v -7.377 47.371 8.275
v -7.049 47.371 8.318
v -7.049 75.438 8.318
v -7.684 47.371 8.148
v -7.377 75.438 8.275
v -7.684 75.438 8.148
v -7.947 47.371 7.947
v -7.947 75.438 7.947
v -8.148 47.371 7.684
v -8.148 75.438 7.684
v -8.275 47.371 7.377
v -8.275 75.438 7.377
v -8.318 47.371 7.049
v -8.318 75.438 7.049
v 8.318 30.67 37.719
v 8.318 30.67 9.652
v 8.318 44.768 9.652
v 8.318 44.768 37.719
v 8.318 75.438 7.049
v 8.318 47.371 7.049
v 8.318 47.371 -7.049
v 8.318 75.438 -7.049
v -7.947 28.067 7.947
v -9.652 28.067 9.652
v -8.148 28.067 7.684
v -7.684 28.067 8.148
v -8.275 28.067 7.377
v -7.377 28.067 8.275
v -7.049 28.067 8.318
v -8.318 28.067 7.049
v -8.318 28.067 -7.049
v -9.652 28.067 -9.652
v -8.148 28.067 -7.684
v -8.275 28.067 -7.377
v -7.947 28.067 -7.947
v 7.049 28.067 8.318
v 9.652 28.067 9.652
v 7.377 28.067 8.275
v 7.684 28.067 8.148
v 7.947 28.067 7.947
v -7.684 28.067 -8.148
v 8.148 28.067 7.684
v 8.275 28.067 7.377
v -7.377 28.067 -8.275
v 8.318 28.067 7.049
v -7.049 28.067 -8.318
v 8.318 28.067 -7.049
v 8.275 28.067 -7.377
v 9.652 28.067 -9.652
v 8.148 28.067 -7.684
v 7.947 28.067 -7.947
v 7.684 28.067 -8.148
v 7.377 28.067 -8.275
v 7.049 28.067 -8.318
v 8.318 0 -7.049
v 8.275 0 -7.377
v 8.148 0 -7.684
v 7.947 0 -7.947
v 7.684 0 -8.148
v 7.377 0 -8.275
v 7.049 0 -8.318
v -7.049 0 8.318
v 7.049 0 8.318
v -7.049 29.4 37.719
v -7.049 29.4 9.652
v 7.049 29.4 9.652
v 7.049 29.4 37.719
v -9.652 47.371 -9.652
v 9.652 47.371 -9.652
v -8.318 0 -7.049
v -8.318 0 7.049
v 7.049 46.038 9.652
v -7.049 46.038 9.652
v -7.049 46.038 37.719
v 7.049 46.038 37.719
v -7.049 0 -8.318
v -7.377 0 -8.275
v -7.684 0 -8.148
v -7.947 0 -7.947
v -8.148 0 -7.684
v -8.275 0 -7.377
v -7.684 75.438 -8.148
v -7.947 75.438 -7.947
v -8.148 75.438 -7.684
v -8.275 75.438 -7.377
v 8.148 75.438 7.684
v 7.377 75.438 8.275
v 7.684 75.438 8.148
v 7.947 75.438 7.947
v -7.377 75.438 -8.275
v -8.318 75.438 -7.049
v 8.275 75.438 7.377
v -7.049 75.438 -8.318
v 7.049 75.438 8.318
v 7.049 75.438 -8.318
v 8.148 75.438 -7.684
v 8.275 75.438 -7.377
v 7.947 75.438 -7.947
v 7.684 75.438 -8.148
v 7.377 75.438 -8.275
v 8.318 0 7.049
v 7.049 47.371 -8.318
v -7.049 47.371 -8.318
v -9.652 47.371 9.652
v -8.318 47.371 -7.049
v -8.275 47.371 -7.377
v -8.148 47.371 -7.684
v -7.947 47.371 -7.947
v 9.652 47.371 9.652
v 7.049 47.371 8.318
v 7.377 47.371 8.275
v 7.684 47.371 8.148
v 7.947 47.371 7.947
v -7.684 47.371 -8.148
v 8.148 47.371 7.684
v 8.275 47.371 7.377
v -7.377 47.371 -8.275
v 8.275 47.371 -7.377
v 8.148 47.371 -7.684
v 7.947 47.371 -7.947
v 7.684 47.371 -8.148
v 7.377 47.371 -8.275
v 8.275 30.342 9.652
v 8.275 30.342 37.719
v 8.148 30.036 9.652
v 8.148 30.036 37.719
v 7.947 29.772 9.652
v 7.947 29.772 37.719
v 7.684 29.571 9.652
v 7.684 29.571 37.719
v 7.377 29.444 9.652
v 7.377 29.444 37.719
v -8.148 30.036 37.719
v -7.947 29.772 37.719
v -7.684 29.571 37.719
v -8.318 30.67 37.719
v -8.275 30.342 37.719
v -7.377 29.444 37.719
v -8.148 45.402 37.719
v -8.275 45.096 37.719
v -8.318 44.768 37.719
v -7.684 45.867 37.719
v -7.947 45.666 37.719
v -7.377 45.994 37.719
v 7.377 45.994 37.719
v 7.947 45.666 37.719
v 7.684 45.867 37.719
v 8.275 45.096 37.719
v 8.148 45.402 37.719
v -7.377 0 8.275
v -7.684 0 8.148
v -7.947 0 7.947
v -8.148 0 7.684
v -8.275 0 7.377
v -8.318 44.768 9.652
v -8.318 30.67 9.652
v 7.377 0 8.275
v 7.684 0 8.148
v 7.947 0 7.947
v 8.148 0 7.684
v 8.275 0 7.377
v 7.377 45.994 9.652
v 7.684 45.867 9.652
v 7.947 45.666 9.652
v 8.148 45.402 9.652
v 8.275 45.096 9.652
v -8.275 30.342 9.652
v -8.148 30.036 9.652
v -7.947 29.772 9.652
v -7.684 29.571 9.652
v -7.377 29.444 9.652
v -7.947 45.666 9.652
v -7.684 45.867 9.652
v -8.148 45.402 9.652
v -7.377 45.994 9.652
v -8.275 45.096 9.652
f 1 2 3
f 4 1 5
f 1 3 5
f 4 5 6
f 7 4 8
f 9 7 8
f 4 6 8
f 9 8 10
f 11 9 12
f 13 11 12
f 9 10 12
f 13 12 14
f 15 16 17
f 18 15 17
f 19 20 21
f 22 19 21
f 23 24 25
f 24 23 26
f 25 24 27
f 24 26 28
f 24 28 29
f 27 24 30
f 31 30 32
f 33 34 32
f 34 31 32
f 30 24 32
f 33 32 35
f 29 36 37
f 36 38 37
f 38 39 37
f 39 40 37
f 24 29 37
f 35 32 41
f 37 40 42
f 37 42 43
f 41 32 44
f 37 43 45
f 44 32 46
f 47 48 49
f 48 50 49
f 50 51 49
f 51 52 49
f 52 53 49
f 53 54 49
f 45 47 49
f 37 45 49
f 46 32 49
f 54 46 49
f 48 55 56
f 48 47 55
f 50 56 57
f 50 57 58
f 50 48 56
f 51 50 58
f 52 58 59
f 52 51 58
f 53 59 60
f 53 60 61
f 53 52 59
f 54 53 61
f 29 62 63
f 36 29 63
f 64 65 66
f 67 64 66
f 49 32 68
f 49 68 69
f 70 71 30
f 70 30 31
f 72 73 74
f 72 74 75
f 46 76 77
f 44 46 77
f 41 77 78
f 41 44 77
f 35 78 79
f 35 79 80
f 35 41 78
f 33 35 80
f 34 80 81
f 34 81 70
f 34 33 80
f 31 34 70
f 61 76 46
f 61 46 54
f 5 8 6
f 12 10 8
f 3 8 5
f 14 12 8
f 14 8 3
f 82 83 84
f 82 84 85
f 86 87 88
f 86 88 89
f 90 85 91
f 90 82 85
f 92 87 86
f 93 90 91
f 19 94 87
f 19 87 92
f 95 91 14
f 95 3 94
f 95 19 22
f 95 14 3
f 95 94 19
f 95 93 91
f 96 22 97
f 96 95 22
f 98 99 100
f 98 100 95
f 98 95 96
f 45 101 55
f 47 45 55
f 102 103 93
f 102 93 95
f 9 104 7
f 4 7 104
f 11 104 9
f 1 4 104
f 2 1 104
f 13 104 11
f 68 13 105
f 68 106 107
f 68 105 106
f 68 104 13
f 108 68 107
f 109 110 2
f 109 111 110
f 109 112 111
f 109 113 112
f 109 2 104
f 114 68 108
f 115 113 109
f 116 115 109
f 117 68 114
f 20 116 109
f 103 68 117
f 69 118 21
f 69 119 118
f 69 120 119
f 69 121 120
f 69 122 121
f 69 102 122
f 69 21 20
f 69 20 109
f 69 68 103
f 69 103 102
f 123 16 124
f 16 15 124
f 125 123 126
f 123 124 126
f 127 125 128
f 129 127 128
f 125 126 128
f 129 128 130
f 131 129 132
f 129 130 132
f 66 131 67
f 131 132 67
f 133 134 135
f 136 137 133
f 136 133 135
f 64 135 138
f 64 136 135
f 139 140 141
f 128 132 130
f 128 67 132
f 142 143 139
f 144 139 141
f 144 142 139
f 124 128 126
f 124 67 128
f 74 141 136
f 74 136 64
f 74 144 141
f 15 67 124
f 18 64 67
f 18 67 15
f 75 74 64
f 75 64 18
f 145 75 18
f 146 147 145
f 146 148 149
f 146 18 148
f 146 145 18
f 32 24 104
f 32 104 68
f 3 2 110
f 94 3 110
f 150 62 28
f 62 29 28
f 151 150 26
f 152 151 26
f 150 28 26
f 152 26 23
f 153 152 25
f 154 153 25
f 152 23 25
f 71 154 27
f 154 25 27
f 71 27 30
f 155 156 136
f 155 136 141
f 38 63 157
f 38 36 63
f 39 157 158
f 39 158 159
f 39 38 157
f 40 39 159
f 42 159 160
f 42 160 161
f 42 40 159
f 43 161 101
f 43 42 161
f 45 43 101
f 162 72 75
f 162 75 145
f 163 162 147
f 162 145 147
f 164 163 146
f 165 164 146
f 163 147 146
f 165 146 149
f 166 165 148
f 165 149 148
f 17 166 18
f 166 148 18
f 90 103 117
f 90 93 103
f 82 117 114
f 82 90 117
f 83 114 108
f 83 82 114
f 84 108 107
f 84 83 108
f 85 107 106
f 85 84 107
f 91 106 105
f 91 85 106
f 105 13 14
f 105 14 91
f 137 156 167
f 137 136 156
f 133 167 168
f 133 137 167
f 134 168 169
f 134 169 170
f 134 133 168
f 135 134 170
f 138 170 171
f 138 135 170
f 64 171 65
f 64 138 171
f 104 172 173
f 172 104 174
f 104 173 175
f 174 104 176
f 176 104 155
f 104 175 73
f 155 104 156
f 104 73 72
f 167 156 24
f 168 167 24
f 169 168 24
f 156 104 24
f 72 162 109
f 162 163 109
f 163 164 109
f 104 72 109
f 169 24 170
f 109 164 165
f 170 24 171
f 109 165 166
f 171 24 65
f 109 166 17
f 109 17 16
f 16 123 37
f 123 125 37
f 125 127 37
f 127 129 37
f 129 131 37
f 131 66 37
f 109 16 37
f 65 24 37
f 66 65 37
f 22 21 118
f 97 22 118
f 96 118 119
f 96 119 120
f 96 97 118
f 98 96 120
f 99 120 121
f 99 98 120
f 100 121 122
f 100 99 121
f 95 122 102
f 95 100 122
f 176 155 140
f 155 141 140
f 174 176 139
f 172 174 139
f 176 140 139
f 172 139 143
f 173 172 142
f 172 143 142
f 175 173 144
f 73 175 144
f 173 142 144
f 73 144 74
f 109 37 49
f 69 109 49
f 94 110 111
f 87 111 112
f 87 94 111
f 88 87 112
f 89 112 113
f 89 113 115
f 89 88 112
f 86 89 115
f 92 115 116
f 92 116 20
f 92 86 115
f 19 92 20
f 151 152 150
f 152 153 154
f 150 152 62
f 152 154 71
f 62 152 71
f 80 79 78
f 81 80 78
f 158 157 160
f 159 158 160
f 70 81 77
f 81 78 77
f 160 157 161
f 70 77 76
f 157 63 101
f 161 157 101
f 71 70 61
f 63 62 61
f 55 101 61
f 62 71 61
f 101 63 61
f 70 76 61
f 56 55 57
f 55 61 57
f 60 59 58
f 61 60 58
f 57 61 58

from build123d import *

# Parameters (mm, degrees)
SKETCH1_W           = 16.637
SKETCH1_H           = 16.637
BOSS_EXTRUDE1_DEPTH = 28.067
SKETCH2_W           = 19.304
SKETCH2_H           = 19.304
BOSS_EXTRUDE2_DEPTH = 19.304
SKETCH3_W           = 16.637
SKETCH3_H           = 16.637
BOSS_EXTRUDE3_DEPTH = 28.067
SKETCH5_W           = 16.637
SKETCH5_H           = 16.637
BOSS_EXTRUDE4_DEPTH = 28.067
FILLET1_R           = 1.27


with BuildPart() as part:
    # Sketch1 → Boss-Extrude1 (new body)
    with BuildSketch(Plane(origin=(0, 0, 0), x_dir=(1, 0, 0), z_dir=(0, 1, 0))):
        Rectangle(SKETCH1_W, SKETCH1_H)
    extrude(amount=BOSS_EXTRUDE1_DEPTH)

    # Sketch2 → Boss-Extrude2 (add)
    with BuildSketch(Plane(origin=(0, 28.067, 0), x_dir=(1, 0, 0), z_dir=(0, 1, 0))):
        Rectangle(SKETCH2_W, SKETCH2_H)
    extrude(amount=BOSS_EXTRUDE2_DEPTH)

    # Sketch3 → Boss-Extrude3 (add)
    with BuildSketch(Plane.XY.offset(9.652)):
        with Locations((0, 37.719)):
            Rectangle(SKETCH3_W, SKETCH3_H)
    extrude(amount=BOSS_EXTRUDE3_DEPTH)

    # Sketch5 → Boss-Extrude4 (add)
    with BuildSketch(Plane(origin=(0, 47.371, 0), x_dir=(1, 0, 0), z_dir=(0, 1, 0))):
        Rectangle(SKETCH5_W, SKETCH5_H)
    extrude(amount=BOSS_EXTRUDE4_DEPTH)

    # Fillet1
    fillet1_edges = [part.edges().sort_by_distance(p)[0] for p in [
        (8.3185, 29.4005, 23.6855),
        (8.3185, 46.0375, 23.6855),
        (-8.3185, 46.0375, 23.6855),
        (-8.3185, 29.4005, 23.6855),
        (8.3185, 61.4045, 8.3185),
        (8.3185, 61.4045, -8.3185),
        (-8.3185, 61.4045, -8.3185),
        (-8.3185, 61.4045, 8.3185),
        (8.3185, 14.0335, 8.3185),
        (-8.3185, 14.0335, 8.3185),
        (-8.3185, 14.0335, -8.3185),
        (8.3185, 14.0335, -8.3185),
    ]]
    fillet(fillet1_edges, radius=FILLET1_R)


solid = part.part
